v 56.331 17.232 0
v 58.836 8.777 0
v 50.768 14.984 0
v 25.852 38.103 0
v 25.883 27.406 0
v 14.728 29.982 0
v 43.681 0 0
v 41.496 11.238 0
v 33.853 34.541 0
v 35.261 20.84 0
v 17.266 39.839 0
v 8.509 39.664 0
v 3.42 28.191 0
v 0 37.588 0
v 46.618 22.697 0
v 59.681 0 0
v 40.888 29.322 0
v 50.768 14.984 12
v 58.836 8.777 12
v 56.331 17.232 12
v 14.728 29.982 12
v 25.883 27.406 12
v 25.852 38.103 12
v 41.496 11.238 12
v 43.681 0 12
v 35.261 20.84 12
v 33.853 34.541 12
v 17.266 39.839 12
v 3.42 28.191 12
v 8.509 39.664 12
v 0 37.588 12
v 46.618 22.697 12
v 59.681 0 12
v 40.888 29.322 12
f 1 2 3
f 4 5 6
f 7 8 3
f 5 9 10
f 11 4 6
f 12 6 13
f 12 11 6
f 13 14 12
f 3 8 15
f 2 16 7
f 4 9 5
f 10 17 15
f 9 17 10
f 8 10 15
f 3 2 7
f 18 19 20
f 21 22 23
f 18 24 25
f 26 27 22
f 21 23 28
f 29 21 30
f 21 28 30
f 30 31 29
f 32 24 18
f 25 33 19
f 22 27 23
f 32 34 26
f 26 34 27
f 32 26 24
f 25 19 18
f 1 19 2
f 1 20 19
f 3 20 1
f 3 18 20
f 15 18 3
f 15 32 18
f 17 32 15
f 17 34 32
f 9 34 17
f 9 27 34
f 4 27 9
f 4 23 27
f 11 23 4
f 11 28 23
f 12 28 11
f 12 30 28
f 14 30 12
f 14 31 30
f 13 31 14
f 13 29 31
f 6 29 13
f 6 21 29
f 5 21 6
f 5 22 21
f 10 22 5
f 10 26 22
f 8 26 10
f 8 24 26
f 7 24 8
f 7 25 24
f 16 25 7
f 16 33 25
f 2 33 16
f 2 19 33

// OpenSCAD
$fn = 32;

// ----------------------------------------------------------------------
// Arc stop: segment, 12 mm thick
// ----------------------------------------------------------------------

// --- parameters (mm) ---
profile_height = 12;      // extrusion height
profile_points = 17;      // points of the closed outline

profile = [[59.681, 0], [58.836, 8.777], [56.331, 17.232], [50.768, 14.984], [46.618, 22.697], [40.888, 29.322], [33.853, 34.541], [25.852, 38.103], [17.266, 39.839], [8.509, 39.664], [0, 37.588], [3.42, 28.191], [14.728, 29.982], [25.883, 27.406], [35.261, 20.84], [41.496, 11.238], [43.681, 0]];  // single closed polygon, 17 points, counter clockwise

// --- the one profile operation ---
linear_extrude(height = profile_height) polygon(points = profile);
